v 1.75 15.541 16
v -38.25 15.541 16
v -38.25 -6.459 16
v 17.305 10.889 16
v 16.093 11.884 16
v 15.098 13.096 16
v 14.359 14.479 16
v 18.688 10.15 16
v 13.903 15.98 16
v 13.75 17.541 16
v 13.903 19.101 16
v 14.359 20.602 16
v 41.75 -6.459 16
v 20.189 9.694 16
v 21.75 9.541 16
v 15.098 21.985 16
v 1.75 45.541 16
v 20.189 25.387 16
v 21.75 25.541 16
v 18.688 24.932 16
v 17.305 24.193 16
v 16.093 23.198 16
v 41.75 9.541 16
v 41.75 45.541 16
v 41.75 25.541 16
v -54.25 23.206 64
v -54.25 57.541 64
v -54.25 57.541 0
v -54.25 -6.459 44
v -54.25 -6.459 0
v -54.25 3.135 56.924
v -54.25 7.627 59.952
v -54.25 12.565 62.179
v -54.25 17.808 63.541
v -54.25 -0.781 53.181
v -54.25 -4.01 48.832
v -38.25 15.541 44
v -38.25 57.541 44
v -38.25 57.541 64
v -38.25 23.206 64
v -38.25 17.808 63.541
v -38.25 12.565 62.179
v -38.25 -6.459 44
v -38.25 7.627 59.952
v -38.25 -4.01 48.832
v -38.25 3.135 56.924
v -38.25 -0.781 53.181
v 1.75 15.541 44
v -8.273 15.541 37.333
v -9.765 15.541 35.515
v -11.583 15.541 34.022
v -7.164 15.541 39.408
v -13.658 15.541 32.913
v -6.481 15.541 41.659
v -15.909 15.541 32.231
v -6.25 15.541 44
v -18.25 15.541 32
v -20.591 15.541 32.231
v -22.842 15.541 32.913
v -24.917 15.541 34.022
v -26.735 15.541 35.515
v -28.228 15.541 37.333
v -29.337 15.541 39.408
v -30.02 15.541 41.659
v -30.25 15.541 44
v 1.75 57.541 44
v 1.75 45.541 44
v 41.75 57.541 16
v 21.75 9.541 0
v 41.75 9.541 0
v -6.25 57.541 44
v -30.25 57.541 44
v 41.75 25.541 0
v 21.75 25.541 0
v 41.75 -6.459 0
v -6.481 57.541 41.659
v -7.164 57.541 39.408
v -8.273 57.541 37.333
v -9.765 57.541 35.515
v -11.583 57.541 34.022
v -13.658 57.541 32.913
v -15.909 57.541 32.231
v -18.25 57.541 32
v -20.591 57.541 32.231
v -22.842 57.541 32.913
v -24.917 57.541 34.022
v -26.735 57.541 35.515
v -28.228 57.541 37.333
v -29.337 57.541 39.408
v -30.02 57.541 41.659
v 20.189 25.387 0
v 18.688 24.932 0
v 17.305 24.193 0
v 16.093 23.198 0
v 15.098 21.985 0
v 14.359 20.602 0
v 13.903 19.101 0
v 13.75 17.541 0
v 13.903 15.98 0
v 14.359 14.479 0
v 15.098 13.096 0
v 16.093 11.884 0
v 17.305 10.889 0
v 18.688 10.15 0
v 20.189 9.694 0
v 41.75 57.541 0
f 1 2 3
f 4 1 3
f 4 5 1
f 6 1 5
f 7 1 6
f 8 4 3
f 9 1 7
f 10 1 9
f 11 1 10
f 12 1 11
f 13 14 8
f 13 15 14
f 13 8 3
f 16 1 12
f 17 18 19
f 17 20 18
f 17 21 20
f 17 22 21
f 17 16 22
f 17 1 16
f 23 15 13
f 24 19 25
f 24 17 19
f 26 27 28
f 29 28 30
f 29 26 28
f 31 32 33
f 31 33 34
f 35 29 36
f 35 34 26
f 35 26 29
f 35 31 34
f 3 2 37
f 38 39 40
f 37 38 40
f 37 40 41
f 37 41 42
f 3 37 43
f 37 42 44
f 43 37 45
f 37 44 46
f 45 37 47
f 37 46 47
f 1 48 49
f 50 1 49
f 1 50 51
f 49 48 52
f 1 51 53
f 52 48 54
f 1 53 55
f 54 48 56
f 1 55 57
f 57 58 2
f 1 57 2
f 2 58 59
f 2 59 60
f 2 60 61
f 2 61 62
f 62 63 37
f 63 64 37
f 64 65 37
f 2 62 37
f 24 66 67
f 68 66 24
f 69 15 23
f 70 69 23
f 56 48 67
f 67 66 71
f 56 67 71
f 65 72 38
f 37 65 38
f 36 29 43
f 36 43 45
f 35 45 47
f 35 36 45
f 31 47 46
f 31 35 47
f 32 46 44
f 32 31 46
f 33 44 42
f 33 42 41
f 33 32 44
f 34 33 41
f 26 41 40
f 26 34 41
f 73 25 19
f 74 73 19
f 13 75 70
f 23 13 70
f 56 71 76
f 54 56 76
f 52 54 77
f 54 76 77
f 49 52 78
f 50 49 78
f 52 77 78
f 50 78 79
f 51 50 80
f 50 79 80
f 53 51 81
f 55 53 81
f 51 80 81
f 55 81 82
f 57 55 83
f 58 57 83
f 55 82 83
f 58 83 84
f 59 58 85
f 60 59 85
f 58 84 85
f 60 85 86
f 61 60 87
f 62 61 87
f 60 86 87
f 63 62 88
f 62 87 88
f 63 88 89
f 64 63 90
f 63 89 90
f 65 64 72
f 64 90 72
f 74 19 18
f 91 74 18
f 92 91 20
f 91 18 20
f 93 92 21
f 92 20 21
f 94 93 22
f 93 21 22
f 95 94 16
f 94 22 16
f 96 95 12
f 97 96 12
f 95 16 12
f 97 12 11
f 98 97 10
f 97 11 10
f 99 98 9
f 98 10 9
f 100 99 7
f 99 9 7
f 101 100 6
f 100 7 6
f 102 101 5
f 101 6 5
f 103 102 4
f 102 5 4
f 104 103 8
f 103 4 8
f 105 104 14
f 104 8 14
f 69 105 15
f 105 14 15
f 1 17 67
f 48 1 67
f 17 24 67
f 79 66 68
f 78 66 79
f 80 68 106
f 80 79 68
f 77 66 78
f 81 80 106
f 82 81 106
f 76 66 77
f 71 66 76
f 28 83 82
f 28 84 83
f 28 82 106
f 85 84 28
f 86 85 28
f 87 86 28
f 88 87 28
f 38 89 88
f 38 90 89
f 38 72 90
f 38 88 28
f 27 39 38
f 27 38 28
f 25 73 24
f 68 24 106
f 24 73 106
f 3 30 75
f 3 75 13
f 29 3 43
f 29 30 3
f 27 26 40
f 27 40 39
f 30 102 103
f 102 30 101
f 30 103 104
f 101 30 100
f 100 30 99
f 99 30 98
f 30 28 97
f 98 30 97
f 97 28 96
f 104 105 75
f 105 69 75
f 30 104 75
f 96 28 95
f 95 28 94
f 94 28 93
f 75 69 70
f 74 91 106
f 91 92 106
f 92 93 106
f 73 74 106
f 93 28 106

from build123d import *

# Parameters (mm, degrees)
F0_W      = 96
F0_H      = 64
F1_DEPTH  = 16
F3_DEPTH  = 16
F5_DEPTH  = 16
F6_W      = 40
F6_H      = 28
F7_DEPTH  = 42
F9_DEPTH  = 42
F11_DEPTH = 12


with BuildPart() as f1:
    # F0 (on Top) → F1 (new body)
    with BuildSketch(Plane.XY):
        with Locations((-6.250218, 25.54076)):
            Rectangle(F0_W, F0_H)
    extrude(amount=F1_DEPTH)

    # F2 (on face) → F3 (join)
    with BuildSketch(Plane(origin=(-54.250218, 0, 0), x_dir=(0, -1, 0), z_dir=(-1, 0, 0))):
        with BuildLine():
            Line((-57.54076, 16), (6.45924, 16))
            Line((6.45924, 16), (6.45924, 44))
            ThreePointArc((6.45924, 44), (-5.31701, 58.532998), (-23.205554, 64))
            Line((-23.205554, 64), (-57.54076, 64))
            Line((-57.54076, 64), (-57.54076, 16))
        make_face()
    extrude(amount=-F3_DEPTH)

    # F4 (on face) → F5 (cut)
    with BuildSketch(Plane.XY.offset(16)):
        with BuildLine():
            Line((21.749782, 9.54076), (41.749782, 9.54076))
            Line((41.749782, 9.54076), (41.749782, 25.54076))
            Line((41.749782, 25.54076), (21.749782, 25.54076))
            ThreePointArc((21.749782, 25.54076), (13.749782, 17.54076), (21.749782, 9.54076))
        make_face()
    extrude(amount=-F5_DEPTH, mode=Mode.SUBTRACT)

    # F6 (on face) → F7 (join)
    with BuildSketch(Plane(origin=(0, 57.54076, 0), x_dir=(-1, 0, 0), z_dir=(0, 1, 0))):
        with Locations((18.250218, 30)):
            Rectangle(F6_W, F6_H)
    extrude(amount=-F7_DEPTH)

    # F8 (on face) → F9 (cut)
    with BuildSketch(Plane(origin=(0, 57.54076, 0), x_dir=(-1, 0, 0), z_dir=(0, 1, 0))):
        with BuildLine():
            ThreePointArc((6.250218, 44), (18.250218, 32), (30.250218, 44))
            Line((30.250218, 44), (6.250218, 44))
        make_face()
    extrude(amount=-F9_DEPTH, mode=Mode.SUBTRACT)

    # F10 (on face) → F11 (join)
    with BuildSketch(Plane(origin=(0, 57.54076, 0), x_dir=(-1, 0, 0), z_dir=(0, 1, 0))):
        Polygon((-41.749782, 16), (-1.749782, 16), (-1.749782, 44), align=None)
    extrude(amount=-F11_DEPTH)


solid = f1.part
